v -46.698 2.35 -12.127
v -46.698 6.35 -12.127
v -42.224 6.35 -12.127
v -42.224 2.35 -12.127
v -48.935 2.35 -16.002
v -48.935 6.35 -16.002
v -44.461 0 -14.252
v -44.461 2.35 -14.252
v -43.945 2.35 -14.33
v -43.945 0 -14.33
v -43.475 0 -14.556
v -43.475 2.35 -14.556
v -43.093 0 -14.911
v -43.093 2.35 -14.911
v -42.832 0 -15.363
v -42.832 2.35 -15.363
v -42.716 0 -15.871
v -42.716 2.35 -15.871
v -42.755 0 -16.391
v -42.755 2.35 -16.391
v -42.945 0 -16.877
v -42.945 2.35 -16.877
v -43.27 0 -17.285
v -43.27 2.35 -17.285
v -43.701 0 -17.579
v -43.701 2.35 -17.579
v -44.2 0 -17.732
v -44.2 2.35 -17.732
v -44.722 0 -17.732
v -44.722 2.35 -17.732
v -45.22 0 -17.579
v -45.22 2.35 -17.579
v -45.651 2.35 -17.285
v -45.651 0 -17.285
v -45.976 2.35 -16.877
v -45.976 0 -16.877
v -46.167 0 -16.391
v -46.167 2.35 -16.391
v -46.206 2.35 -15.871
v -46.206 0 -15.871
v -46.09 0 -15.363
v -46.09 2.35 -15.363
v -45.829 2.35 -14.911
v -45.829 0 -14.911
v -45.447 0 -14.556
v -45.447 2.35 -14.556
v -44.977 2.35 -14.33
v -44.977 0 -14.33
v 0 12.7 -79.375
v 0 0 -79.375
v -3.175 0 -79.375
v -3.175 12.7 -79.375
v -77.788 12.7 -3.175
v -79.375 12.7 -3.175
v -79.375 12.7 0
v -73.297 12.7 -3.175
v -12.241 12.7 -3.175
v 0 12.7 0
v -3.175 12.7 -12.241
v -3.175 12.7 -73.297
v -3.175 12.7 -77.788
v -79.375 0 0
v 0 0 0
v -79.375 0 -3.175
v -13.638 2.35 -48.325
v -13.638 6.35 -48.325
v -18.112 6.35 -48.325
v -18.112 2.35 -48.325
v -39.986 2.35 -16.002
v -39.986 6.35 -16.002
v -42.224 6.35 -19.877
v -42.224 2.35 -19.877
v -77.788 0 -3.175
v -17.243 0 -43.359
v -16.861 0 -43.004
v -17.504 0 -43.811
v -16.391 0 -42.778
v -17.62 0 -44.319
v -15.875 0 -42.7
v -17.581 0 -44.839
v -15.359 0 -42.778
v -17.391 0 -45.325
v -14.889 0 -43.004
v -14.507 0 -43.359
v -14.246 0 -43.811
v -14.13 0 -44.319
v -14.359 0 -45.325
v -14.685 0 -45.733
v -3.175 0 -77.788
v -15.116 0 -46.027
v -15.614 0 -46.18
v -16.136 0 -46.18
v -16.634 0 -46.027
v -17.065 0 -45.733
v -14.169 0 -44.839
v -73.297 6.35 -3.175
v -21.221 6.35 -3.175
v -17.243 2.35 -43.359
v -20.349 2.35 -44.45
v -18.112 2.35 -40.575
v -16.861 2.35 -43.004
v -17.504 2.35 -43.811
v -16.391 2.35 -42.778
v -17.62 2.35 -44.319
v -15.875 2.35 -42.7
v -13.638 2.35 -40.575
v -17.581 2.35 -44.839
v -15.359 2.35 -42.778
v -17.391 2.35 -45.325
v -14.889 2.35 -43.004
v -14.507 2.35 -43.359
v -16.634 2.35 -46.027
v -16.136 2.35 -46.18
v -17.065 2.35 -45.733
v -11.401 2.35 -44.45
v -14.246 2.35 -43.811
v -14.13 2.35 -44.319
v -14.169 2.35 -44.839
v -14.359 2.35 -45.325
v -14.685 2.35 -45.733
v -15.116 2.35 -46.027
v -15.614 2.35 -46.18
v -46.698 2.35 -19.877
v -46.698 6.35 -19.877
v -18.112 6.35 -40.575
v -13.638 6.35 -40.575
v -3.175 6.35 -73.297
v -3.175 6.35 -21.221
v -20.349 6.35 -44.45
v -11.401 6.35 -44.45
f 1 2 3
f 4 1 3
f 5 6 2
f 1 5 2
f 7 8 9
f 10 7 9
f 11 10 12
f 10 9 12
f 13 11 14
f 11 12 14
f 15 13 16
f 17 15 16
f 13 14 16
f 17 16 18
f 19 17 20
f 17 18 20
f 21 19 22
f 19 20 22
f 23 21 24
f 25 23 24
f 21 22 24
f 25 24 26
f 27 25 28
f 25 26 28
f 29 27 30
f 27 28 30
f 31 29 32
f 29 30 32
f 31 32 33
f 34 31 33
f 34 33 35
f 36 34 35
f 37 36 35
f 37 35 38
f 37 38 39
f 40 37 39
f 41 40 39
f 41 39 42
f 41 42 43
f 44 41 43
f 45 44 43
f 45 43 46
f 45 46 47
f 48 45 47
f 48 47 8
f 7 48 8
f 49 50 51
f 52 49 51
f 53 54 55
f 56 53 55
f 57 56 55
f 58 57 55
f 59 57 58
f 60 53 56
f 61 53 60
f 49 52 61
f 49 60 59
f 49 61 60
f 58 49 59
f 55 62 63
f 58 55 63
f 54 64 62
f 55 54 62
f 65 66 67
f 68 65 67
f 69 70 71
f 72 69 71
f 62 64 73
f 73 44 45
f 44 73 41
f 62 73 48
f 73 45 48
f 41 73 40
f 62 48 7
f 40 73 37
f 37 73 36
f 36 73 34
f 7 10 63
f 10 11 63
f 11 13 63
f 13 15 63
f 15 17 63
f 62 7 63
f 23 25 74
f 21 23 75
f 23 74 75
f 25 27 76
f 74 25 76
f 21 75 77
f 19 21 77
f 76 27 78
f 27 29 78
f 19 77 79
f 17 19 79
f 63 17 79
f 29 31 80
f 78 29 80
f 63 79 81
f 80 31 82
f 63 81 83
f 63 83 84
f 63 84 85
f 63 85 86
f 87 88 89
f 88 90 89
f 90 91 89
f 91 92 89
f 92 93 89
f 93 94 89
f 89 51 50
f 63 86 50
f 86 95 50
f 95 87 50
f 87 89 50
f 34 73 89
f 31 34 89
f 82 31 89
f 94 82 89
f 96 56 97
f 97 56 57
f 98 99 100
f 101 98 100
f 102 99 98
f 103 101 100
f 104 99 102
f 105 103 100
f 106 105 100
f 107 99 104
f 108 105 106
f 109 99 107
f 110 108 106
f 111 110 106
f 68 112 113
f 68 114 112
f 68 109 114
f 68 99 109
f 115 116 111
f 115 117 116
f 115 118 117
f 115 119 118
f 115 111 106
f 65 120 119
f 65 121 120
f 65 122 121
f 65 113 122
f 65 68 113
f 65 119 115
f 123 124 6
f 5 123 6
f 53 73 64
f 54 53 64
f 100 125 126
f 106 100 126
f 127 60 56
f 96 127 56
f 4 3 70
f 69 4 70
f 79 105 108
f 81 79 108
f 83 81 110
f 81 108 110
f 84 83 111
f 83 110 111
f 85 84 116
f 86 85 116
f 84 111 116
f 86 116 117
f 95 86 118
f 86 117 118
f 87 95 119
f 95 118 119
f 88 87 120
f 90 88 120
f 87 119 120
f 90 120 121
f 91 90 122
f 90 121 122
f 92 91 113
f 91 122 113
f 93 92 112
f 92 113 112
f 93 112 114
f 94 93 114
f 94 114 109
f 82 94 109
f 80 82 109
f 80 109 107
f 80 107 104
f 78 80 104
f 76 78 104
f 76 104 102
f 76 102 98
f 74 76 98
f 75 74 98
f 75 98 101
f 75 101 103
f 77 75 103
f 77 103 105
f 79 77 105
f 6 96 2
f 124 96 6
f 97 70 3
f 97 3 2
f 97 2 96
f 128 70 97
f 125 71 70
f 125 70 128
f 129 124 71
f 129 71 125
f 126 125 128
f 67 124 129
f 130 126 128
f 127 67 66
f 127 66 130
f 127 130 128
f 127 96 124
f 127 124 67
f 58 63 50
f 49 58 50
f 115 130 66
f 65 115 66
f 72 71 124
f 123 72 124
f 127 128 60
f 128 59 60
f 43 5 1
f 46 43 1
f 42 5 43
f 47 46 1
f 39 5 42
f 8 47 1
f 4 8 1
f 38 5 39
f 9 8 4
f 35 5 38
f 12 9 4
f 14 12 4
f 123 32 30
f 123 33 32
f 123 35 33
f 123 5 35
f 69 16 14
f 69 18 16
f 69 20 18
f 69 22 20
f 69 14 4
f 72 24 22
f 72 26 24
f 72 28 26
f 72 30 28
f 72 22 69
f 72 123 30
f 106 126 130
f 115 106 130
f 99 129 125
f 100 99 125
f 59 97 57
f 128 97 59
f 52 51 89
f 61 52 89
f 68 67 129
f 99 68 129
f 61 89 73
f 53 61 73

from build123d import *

# Parameters (mm, degrees)
BOSS_EXTRUDE1_DEPTH = 12.7
CUT_EXTRUDE1_DEPTH  = 6.35
CHAMFER1_SIZE       = 6.35
SKETCH3_R           = 1.75
CUT_EXTRUDE2_DEPTH  = 6.35
SKETCH4_R           = 1.75
CUT_EXTRUDE3_DEPTH  = 4


with BuildPart() as part:
    # Sketch1 → Boss-Extrude1 (new body)
    with BuildSketch(Plane(origin=(0, 0, 0), x_dir=(1, 0, 0), z_dir=(0, 1, 0))):
        Polygon((-79.375, 0), (0, 0), (0, 79.375), (-3.175, 79.375), (-3.175, 77.7875), (-77.7875, 3.175), (-79.375, 3.175), align=None)
    extrude(amount=BOSS_EXTRUDE1_DEPTH)

    # Sketch2 → Cut-Extrude1 (cut)
    with BuildSketch(Plane(origin=(0, 12.7, 0), x_dir=(1, 0, 0), z_dir=(0, 1, 0))):
        Polygon((-73.297371939, 3.175), (-12.241098836, 3.175), (-3.175, 12.241098836), (-3.175, 73.297371939), align=None)
    extrude(amount=-CUT_EXTRUDE1_DEPTH, mode=Mode.SUBTRACT)

    # Chamfer1
    chamfer1_edges = [part.edges().sort_by_distance(p)[0] for p in [
        (-7.708049418, 6.35, -7.708049418),
    ]]
    chamfer(chamfer1_edges, length=CHAMFER1_SIZE - 0.0001)  # a hair under: the kernel refuses the full size

    # Sketch3 → Cut-Extrude2 (cut)
    with BuildSketch(Plane(origin=(0, 6.35, 0), x_dir=(1, 0, 0), z_dir=(0, 1, 0))):
        with Locations(Location((-44.460787159, 16.002, 0), (0, 0, 270))):
            Circle(SKETCH3_R)
        with Locations(Location((-15.875, 44.45, 0), (0, 0, 270))):
            Circle(SKETCH3_R)
    extrude(amount=-CUT_EXTRUDE2_DEPTH, mode=Mode.SUBTRACT)

    # Sketch4 → Cut-Extrude3 (cut)
    # profile 1 of 2: a face of its own
    with BuildSketch(Plane(origin=(0, 6.35, 0), x_dir=(1, 0, 0), z_dir=(0, 1, 0))):
        Polygon((-13.637767707, 40.575), (-11.400535414, 44.45), (-13.637767707, 48.325), (-18.112232293, 48.325), (-20.349464586, 44.45), (-18.112232293, 40.575), align=None)
        with Locations(Location((-15.875, 44.45, 0), (0, 0, 270))):
            Circle(SKETCH4_R, mode=Mode.SUBTRACT)
    # profile 2 of 2: a face of its own
    with BuildSketch(Plane(origin=(0, 6.35, 0), x_dir=(1, 0, 0), z_dir=(0, 1, 0))):
        Polygon((-39.986322573, 16.002), (-42.223554866, 19.877), (-46.698019452, 19.877), (-48.935251745, 16.002), (-46.698019452, 12.127), (-42.223554866, 12.127), align=None)
        with Locations(Location((-44.460787159, 16.002, 0), (0, 0, 270))):
            Circle(SKETCH4_R, mode=Mode.SUBTRACT)
    extrude(amount=-CUT_EXTRUDE3_DEPTH, mode=Mode.SUBTRACT)


solid = part.part
